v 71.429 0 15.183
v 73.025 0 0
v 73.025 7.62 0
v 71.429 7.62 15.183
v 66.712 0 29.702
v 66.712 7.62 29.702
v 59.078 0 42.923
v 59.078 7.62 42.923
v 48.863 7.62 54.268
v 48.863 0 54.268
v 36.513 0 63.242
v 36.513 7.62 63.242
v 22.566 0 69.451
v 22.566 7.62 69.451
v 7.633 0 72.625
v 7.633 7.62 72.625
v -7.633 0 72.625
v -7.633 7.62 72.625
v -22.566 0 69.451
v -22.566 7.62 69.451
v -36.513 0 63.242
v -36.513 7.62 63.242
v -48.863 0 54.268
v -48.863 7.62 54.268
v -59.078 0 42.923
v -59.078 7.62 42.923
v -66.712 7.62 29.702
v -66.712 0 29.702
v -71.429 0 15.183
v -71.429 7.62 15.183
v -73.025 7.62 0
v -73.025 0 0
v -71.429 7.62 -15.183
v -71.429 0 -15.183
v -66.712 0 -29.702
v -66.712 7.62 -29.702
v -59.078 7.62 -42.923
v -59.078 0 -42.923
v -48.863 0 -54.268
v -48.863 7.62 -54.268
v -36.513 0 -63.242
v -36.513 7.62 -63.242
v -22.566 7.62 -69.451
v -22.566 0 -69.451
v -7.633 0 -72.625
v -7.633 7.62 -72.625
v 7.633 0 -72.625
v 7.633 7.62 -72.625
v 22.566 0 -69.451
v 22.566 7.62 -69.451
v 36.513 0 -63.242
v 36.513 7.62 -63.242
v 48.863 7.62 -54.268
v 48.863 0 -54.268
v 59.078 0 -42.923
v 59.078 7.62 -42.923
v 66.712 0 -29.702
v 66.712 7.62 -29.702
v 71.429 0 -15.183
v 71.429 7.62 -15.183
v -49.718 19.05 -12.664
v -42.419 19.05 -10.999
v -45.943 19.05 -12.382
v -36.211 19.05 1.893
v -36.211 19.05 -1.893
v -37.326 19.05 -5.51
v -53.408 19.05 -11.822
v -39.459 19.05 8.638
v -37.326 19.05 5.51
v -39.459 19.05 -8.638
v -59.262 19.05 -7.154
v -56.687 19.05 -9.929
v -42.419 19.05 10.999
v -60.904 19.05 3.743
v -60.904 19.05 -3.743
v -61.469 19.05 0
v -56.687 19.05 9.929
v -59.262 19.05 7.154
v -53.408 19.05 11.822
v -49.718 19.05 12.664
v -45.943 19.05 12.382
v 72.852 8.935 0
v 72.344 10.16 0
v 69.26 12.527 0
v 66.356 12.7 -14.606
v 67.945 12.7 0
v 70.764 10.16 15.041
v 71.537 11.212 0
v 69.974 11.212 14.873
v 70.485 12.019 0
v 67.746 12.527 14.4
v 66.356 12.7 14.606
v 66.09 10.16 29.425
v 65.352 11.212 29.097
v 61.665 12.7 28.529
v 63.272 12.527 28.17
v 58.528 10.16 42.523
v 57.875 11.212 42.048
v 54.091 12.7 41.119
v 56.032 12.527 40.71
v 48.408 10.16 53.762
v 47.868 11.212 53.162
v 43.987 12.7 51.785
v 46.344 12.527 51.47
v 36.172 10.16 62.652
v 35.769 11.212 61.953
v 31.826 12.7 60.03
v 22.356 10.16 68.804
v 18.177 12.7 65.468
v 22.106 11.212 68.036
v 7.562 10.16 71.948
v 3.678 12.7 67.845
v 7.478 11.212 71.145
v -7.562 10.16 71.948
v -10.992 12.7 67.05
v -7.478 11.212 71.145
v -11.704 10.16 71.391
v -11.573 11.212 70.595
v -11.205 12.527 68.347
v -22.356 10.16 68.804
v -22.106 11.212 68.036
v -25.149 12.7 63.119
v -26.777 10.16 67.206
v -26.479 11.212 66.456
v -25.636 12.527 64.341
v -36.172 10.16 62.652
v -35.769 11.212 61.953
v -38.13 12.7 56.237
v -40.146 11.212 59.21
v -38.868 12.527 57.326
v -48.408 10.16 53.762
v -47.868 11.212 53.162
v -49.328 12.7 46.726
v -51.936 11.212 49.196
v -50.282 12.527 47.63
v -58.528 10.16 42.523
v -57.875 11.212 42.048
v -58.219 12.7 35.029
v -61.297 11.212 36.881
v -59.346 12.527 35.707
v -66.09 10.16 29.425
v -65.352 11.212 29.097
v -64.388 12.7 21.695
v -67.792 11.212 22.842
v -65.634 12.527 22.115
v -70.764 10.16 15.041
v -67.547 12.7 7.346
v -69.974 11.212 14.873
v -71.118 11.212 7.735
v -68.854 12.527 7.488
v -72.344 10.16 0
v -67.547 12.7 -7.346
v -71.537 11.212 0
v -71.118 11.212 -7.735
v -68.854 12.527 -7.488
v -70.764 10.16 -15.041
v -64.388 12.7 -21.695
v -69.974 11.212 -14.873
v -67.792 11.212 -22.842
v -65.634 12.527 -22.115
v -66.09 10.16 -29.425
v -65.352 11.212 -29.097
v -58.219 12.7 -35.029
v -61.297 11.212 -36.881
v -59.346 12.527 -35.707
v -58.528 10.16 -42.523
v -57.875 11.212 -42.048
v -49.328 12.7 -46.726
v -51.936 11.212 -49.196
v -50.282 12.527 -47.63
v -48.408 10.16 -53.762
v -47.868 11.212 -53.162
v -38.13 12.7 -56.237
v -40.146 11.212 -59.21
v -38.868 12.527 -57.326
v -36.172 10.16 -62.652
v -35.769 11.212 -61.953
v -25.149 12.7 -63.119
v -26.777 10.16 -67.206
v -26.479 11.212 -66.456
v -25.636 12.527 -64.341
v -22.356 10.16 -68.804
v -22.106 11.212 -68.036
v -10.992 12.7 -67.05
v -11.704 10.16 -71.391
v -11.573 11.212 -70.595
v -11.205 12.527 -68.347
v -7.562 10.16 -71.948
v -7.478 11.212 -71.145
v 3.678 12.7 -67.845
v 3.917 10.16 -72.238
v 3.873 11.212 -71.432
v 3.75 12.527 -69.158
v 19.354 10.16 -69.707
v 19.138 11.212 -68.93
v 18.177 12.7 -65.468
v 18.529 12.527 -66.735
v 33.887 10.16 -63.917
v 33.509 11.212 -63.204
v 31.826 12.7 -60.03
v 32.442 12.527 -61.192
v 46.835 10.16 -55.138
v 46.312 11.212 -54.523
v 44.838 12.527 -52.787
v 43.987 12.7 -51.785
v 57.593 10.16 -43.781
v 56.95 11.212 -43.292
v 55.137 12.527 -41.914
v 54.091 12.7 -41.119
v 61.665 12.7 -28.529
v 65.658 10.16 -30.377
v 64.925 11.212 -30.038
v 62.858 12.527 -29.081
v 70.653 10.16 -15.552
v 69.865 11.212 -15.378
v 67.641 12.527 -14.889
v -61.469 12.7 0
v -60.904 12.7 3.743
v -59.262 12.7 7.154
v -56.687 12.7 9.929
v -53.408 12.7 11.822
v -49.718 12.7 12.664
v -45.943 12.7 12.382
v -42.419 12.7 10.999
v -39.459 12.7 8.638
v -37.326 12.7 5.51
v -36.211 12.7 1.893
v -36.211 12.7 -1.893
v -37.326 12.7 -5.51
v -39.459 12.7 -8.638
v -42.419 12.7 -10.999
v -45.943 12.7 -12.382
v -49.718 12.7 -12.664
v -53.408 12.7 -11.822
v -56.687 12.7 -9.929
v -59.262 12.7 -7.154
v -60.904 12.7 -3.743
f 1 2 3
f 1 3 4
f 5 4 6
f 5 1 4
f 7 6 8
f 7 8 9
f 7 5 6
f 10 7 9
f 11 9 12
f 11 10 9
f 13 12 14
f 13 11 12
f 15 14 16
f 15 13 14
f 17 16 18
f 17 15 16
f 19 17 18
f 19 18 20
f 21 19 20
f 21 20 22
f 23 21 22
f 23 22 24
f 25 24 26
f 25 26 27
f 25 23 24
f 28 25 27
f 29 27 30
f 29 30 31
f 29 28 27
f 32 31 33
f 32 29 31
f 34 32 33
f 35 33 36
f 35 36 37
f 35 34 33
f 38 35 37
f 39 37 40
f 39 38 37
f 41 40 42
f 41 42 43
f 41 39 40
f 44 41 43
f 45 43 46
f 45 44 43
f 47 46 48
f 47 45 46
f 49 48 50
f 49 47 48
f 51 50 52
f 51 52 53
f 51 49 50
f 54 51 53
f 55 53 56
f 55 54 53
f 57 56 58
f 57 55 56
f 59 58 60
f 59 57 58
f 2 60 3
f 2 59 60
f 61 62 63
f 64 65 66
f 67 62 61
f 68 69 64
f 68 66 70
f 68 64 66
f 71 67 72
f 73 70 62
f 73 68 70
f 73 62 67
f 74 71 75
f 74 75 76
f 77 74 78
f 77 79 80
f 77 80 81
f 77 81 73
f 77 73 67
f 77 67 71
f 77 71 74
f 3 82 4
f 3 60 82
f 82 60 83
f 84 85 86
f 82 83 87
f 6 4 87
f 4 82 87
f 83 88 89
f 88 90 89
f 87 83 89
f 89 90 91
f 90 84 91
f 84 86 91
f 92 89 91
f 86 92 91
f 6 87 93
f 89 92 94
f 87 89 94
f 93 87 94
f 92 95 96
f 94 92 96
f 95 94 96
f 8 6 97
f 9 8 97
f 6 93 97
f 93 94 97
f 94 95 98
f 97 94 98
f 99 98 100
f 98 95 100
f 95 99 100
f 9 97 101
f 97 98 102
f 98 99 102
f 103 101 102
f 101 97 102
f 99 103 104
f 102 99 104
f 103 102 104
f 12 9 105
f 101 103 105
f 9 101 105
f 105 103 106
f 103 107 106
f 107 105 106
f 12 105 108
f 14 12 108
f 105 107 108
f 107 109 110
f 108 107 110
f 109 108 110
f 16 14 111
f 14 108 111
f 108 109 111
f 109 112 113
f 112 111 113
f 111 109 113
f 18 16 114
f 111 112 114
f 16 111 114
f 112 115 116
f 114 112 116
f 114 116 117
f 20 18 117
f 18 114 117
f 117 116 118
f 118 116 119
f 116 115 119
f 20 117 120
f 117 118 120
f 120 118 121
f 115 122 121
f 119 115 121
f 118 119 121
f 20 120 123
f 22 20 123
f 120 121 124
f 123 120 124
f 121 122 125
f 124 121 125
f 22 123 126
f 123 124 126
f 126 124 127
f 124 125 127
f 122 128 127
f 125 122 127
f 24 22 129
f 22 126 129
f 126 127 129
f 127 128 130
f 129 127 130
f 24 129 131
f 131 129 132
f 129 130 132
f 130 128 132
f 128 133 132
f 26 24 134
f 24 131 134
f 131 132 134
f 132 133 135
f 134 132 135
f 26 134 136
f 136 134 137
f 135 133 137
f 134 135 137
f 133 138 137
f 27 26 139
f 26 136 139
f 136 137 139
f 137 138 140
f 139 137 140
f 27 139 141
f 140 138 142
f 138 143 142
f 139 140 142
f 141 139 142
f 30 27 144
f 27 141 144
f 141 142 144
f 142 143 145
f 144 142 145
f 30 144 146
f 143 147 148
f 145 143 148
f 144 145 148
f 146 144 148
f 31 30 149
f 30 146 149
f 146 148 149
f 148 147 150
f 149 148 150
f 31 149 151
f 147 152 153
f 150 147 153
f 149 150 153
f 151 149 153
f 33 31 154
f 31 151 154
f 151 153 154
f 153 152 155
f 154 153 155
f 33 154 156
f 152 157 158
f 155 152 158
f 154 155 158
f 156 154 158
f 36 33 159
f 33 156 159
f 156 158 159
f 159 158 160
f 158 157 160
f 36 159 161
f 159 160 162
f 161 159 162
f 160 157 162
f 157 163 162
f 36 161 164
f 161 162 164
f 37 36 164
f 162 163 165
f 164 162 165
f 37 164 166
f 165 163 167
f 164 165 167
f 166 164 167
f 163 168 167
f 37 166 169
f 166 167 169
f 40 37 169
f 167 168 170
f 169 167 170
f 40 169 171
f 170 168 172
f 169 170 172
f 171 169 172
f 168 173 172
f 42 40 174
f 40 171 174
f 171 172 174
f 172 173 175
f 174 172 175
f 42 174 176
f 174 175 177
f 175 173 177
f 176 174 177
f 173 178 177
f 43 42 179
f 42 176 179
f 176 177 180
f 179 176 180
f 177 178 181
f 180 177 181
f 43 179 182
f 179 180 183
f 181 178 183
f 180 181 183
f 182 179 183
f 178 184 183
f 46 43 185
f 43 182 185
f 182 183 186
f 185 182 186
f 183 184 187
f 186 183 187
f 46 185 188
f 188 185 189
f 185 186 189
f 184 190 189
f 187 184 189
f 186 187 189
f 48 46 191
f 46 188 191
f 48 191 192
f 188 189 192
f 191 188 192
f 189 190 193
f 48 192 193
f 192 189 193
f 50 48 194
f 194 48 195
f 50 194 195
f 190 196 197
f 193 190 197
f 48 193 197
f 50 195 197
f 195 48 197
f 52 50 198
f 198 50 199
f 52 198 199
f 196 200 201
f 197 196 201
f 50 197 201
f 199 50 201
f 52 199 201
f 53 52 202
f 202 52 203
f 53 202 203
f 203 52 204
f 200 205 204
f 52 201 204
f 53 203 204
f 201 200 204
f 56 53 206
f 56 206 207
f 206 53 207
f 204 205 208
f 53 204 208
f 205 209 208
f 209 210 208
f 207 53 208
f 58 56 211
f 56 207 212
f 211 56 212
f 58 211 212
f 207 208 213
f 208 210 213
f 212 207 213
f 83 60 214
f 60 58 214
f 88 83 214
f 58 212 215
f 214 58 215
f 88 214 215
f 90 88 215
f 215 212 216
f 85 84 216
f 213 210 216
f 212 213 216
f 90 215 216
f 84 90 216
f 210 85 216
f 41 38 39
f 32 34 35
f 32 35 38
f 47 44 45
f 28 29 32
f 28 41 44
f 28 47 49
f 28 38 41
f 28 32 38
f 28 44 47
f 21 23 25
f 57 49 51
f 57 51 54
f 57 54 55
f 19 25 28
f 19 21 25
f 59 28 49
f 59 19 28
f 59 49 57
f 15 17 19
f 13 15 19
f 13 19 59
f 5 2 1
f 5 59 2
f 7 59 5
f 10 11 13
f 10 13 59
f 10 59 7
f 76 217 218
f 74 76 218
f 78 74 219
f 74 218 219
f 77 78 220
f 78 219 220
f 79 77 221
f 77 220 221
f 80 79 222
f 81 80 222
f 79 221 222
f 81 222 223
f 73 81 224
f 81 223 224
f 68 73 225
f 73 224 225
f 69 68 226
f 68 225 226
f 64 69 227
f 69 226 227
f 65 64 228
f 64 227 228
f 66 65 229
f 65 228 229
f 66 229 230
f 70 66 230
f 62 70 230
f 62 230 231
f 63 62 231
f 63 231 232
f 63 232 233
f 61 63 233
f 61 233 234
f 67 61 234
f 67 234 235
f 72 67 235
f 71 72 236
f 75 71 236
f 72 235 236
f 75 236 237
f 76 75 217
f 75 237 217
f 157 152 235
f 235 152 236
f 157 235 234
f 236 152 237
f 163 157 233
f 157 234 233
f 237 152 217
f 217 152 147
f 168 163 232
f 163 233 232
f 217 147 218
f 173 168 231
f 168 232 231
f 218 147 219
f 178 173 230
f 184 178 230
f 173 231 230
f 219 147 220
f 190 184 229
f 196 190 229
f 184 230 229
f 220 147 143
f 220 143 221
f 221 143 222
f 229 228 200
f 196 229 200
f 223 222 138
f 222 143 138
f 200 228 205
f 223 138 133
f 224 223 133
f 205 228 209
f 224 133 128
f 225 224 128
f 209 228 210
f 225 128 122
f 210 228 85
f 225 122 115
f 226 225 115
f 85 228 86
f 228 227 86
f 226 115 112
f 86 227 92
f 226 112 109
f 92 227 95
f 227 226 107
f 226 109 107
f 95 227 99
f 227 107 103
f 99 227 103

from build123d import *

# Parameters (mm, degrees)
F0_R     = 73.025
F1_DEPTH = 12.7
F2_R     = 5.08
F3_R     = 12.7
F4_DEPTH = 6.35


with BuildPart() as f1:
    # F0 (on Front) → F1 (new body)
    with BuildSketch(Plane.XZ):
        Circle(F0_R)
    extrude(amount=-F1_DEPTH)

    # F2
    f2_edges = [f1.edges().sort_by_distance(p)[0] for p in [
        (-73.025, 12.7, 0),
    ]]
    fillet(f2_edges, radius=F2_R)

    # F3 (on face) → F4 (join)
    with BuildSketch(Plane(origin=(0, 12.7, 0), x_dir=(-1, 0, 0), z_dir=(0, 1, 0))):
        with Locations((48.768654, 0)):
            Circle(F3_R)
    extrude(amount=F4_DEPTH)


solid = f1.part
